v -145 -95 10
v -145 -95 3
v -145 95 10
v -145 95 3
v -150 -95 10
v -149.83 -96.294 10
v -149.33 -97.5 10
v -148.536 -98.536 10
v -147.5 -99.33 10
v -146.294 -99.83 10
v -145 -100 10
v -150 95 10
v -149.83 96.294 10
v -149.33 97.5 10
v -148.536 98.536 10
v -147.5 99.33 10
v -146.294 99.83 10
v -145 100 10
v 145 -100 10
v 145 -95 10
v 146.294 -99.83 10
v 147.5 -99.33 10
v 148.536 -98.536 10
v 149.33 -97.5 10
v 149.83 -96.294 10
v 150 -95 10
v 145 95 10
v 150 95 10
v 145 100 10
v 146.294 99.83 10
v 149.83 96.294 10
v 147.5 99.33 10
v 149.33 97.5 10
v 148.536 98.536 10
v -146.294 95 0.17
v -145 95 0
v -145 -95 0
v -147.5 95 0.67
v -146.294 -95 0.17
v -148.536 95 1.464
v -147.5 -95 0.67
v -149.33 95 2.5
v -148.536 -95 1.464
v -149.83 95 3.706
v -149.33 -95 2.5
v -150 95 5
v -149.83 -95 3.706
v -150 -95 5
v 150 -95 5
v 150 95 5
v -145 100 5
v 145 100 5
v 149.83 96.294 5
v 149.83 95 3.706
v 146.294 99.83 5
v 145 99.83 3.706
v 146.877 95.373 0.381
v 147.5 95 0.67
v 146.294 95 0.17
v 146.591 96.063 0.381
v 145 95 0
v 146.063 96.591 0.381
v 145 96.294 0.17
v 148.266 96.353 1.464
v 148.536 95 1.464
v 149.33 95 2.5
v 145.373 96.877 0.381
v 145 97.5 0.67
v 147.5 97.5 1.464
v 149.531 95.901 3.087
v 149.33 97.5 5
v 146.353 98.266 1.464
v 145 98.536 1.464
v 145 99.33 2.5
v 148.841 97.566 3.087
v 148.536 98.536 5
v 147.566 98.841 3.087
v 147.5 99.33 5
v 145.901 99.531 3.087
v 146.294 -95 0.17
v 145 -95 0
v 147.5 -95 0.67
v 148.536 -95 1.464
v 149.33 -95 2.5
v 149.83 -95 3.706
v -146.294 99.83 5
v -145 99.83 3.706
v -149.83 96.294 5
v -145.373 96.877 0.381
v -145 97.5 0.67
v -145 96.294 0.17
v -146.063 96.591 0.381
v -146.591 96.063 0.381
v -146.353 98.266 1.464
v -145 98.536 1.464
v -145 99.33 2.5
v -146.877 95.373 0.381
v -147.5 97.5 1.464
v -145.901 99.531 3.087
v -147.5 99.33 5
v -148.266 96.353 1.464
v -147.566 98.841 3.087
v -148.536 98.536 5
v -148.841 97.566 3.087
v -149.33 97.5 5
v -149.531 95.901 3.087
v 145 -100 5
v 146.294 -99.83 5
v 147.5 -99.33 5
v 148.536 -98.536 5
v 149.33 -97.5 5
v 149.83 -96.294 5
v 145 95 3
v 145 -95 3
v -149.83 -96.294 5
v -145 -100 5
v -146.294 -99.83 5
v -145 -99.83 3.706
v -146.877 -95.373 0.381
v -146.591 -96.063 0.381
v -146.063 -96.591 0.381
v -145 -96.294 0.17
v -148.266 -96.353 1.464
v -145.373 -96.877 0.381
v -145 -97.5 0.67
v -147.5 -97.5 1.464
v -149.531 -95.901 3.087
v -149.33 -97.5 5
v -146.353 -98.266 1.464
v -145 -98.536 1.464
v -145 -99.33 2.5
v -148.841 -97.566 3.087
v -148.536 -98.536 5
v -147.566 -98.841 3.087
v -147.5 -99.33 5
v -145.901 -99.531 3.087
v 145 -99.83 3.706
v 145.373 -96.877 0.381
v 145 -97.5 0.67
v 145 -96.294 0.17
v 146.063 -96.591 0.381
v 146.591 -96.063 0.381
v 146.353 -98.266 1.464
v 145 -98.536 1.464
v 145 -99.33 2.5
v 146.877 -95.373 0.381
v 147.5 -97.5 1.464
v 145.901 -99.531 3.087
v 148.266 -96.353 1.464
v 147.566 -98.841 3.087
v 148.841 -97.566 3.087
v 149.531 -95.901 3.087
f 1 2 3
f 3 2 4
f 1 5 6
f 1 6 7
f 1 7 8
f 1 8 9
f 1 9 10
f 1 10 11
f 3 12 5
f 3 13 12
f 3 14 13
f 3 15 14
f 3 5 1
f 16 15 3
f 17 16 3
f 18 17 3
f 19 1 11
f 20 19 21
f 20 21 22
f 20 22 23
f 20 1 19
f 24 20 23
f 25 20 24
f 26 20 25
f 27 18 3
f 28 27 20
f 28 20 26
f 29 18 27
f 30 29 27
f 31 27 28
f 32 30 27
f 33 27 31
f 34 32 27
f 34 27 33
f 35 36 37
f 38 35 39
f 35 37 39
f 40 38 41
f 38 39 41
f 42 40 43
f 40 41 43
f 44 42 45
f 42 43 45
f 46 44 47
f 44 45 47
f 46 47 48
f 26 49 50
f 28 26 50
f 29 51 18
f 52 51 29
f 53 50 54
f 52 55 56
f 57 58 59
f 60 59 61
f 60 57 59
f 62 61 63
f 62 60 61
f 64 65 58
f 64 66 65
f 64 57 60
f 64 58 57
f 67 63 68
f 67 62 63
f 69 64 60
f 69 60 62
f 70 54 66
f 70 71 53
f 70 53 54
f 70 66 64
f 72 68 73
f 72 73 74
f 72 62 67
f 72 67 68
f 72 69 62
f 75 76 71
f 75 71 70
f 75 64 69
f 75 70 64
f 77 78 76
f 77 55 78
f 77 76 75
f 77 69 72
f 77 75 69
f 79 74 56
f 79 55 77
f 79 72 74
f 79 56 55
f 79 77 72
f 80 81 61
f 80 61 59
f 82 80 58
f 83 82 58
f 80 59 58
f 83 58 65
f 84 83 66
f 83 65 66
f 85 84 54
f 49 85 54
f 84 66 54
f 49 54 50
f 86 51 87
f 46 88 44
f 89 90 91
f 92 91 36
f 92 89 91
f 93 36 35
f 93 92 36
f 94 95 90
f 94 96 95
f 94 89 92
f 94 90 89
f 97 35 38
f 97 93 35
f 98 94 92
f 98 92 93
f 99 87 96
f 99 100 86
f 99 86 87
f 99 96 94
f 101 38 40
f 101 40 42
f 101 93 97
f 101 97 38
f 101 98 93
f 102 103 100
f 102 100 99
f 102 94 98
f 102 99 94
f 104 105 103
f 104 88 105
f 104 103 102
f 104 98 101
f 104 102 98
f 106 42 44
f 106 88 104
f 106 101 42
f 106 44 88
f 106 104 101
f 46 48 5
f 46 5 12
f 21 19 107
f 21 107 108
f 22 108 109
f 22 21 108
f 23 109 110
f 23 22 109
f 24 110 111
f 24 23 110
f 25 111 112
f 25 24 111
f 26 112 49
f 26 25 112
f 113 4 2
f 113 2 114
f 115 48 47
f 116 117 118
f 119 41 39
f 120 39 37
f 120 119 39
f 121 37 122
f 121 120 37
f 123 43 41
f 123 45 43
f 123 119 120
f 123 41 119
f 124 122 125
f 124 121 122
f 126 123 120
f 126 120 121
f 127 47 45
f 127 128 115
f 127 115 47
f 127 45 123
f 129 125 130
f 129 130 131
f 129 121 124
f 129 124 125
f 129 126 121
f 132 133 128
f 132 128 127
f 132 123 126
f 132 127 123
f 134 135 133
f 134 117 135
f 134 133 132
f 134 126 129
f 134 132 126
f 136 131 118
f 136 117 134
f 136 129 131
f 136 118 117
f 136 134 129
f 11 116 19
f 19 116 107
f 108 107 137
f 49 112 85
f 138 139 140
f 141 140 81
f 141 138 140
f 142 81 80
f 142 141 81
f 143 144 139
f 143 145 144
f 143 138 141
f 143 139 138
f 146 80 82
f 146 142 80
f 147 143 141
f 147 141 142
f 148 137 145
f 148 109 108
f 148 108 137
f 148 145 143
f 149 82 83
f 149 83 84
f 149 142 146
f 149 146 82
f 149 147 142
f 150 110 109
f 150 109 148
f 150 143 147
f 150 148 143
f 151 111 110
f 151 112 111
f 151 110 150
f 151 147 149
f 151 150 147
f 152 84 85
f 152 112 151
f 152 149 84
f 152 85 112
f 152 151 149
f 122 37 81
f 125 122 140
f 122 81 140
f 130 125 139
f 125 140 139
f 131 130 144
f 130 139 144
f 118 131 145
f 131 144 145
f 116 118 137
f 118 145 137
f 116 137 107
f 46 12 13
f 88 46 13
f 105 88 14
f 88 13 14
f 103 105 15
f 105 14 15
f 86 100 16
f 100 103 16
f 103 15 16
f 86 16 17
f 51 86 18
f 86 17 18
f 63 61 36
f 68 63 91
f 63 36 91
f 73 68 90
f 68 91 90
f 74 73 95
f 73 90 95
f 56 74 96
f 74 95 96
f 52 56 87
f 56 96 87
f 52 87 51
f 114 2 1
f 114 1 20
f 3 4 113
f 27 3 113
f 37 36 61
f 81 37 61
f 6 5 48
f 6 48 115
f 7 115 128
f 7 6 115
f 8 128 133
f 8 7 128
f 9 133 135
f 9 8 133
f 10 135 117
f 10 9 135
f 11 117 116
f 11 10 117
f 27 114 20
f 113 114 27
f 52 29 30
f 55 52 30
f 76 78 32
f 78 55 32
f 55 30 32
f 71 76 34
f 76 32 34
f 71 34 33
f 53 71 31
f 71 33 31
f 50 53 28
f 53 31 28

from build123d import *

# Parameters (mm, degrees)
F0_W     = 300
F0_H     = 200
F0_W_2   = 295
F0_H_2   = 195
F0_W_3   = 290
F0_H_3   = 190
F1_DEPTH = 10
F2_DEPTH = 3
F3_DEPTH = 3
F4_R     = 5
F5_R     = 5


with BuildPart() as f1:
    # F0 (on Top) → F1 (new body)
    with BuildSketch(Plane.XY):
        Rectangle(F0_W, F0_H)
        Rectangle(F0_W_2, F0_H_2, mode=Mode.SUBTRACT)
        Rectangle(F0_W_2, F0_H_2)
        Rectangle(F0_W_3, F0_H_3, mode=Mode.SUBTRACT)
    extrude(amount=F1_DEPTH)

    # F0 (on Top) → F2 (cut)
    with BuildSketch(Plane.XY):
        Rectangle(F0_W_2, F0_H_2)
        Rectangle(F0_W_3, F0_H_3, mode=Mode.SUBTRACT)
    extrude(amount=F2_DEPTH, mode=Mode.SUBTRACT)

    # F0 (on Top) → F3 (join)
    with BuildSketch(Plane.XY):
        Rectangle(F0_W_2, F0_H_2)
        Rectangle(F0_W_3, F0_H_3, mode=Mode.SUBTRACT)
        Rectangle(F0_W_3, F0_H_3)
    extrude(amount=F3_DEPTH)

    # F4
    f4_edges = [f1.edges().sort_by_distance(p)[0] for p in [
        (-150, -100, 5),
        (150, -100, 5),
        (150, 100, 5),
        (-150, 100, 5),
    ]]
    fillet(f4_edges, radius=F4_R)

    # F5
    f5_edges = [f1.edges().sort_by_distance(p)[0] for p in [
        (150, 0, 0),
        (148.535534, -98.535534, 0),
        (148.535534, 98.535534, 0),
        (0, -100, 0),
        (0, 100, 0),
        (-148.535534, -98.535534, 0),
        (-148.535534, 98.535534, 0),
        (-150, 0, 0),
    ]]
    fillet(f5_edges, radius=F5_R)


solid = f1.part
